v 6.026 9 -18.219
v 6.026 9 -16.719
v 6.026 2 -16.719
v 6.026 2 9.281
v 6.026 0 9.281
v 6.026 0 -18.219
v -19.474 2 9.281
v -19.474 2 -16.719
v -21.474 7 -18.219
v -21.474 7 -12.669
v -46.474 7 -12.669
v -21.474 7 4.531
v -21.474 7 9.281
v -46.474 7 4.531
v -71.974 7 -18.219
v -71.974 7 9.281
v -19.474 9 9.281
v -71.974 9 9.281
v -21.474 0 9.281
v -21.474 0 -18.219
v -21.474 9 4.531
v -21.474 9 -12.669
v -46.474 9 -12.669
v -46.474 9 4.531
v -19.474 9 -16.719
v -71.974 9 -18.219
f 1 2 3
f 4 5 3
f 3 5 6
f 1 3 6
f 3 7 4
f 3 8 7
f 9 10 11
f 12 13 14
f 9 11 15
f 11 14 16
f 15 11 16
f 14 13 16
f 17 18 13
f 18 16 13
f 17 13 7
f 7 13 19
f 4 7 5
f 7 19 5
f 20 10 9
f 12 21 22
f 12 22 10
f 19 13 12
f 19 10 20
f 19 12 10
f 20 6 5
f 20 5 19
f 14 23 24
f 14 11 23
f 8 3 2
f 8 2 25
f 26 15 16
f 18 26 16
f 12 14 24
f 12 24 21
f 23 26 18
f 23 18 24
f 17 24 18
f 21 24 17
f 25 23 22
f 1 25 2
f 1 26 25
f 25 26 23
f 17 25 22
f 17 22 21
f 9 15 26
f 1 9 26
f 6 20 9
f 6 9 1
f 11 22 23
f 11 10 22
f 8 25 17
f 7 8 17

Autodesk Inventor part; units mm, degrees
ref_plane "YZ Plane" through (0, 0, 0) normal (1, 0, 0) x (0, 1, 0)
ref_plane "XZ Plane" through (0, 0, 0) normal (0, 1, 0) x (-1, 0, 0)
ref_plane "XY Plane" through (0, 0, 0) normal (0, 0, 1) x (1, 0, 0)
sketch "Sketch1" plane through (0, 0, 0) normal (0, 1, 0) x (-1, 0, 0)
  line L0 (71.974, 9.2811) -> (-6.026, 9.2811)
  line L1 (-6.026, 9.2811) -> (-6.026, -18.2189)
  line L2 (-6.026, -18.2189) -> (71.974, -18.2189)
  line L3 (71.974, -18.2189) -> (71.974, 9.2811)
  point P0 (0, 0)
  dimension "d0" = 27.5
  dimension "d1" = 78
extrude "Extrusion1" add sketch "Sketch1" along normal blind 9
sketch "Sketch2" plane through (0, 9, 0) normal (0, 1, 0) x (1, 0, 0)
  line L0 (6.026, 18.2189) -> (-71.974, 18.2189) projected
  line L1 (-71.974, -9.2811) -> (6.026, -9.2811) projected
  line L2 (6.026, 18.2189) -> (-19.474, 18.2189)
  line L3 (-19.474, 18.2189) -> (-19.474, -9.2811)
  line L4 (-19.474, -9.2811) -> (6.026, -9.2811)
  line L5 (6.026, -9.2811) -> (6.026, 18.2189)
  point P0 (0, 0)
  point P1 (6.026, -9.2811)
  point P2 (-19.474, 18.2189)
  dimension "d4" = 25.5
extrude "Extrusion2" cut sketch "Sketch2" against normal blind 7
sketch "Sketch3" plane through (0, 2, 0) normal (0, 1, 0) x (1, 0, 0)
  point P0 (0, 0)
sketch "Sketch4" plane through (0, 2, 0) normal (0, 1, 0) x (1, 0, 0)
  line L0 (-19.474, -9.2811) -> (-19.474, 18.2189) projected
  line L1 (6.026, -9.2811) -> (6.026, 18.2189) projected
  line L2 (-19.474, 18.2189) -> (6.026, 18.2189)
  line L3 (6.026, 18.2189) -> (6.026, 16.7189)
  line L4 (6.026, 16.7189) -> (-19.474, 16.7189)
  line L5 (-19.474, 16.7189) -> (-19.474, 18.2189)
  point P0 (0, 0)
  point P1 (6.026, 18.2189)
  point P2 (-19.474, 16.7189)
  dimension "d7" = 1.5
extrude "Extrusion3" add sketch "Sketch4" along normal blind 7
sketch "Sketch5" plane through (-71.974, 0, 9.2811) normal (0, 0, 1) x (1, 0, 0)
  line L0 (0, 9) -> (52.5, 9) projected
  line L1 (50.5, 9) -> (50.5, 0)
  line L2 (0, 0) -> (78, 0) projected
  line L3 (52.5, 2) -> (52.5, 9) projected
  line L4 (50.5, 7) -> (0, 7)
  line L5 (52.5, 2) -> (52.5, 9) projected
  line L6 (0, 9) -> (52.5, 9) projected
  line L7 (0, 0) -> (0, 9) projected
  line L8 (0, 0) -> (78, 0) projected
  line L9 (78, 0) -> (78, 2) projected
  line L10 (78, 2) -> (52.5, 2) projected
  point P0 (71.974, 0)
  point P1 (0, 7)
  dimension "d10" = 2
  dimension "d11" = 2
extrude "Extrusion4" cut sketch "Sketch5" against normal blind 44 contours L4 L1 L2 L7
sketch "Sketch8" plane through (-71.974, 7, 9.2811) normal (0, -1, 0) x (1, 0, 0)
  line L0 (50.5, -21.9505) -> (25.5, -21.9505)
  line L1 (25.5, -21.9505) -> (25.5, -4.7505)
  line L2 (25.5, -4.7505) -> (50.5, -4.7505)
  line L3 (50.5, -4.7505) -> (50.5, -21.9505)
  line L4 (50.5, 0) -> (50.5, -27.5) projected
  point P0 (71.974, -9.2811)
  dimension "d20" = 17.2
  dimension "d21" = 25
  dimension "d22" = 0
extrude "Extrusion6" cut sketch "Sketch8" against normal blind 2
ref_plane "Work Plane1" through (-20.474, 2, 9.2811) normal (1, 0, 0) x (0, 0, -1)
sketch "Sketch10" plane through (0, 9, 0) normal (0, 1, 0) x (1, 0, 0)
  point P0 (0, 0)
properties part number "gps _mount"
